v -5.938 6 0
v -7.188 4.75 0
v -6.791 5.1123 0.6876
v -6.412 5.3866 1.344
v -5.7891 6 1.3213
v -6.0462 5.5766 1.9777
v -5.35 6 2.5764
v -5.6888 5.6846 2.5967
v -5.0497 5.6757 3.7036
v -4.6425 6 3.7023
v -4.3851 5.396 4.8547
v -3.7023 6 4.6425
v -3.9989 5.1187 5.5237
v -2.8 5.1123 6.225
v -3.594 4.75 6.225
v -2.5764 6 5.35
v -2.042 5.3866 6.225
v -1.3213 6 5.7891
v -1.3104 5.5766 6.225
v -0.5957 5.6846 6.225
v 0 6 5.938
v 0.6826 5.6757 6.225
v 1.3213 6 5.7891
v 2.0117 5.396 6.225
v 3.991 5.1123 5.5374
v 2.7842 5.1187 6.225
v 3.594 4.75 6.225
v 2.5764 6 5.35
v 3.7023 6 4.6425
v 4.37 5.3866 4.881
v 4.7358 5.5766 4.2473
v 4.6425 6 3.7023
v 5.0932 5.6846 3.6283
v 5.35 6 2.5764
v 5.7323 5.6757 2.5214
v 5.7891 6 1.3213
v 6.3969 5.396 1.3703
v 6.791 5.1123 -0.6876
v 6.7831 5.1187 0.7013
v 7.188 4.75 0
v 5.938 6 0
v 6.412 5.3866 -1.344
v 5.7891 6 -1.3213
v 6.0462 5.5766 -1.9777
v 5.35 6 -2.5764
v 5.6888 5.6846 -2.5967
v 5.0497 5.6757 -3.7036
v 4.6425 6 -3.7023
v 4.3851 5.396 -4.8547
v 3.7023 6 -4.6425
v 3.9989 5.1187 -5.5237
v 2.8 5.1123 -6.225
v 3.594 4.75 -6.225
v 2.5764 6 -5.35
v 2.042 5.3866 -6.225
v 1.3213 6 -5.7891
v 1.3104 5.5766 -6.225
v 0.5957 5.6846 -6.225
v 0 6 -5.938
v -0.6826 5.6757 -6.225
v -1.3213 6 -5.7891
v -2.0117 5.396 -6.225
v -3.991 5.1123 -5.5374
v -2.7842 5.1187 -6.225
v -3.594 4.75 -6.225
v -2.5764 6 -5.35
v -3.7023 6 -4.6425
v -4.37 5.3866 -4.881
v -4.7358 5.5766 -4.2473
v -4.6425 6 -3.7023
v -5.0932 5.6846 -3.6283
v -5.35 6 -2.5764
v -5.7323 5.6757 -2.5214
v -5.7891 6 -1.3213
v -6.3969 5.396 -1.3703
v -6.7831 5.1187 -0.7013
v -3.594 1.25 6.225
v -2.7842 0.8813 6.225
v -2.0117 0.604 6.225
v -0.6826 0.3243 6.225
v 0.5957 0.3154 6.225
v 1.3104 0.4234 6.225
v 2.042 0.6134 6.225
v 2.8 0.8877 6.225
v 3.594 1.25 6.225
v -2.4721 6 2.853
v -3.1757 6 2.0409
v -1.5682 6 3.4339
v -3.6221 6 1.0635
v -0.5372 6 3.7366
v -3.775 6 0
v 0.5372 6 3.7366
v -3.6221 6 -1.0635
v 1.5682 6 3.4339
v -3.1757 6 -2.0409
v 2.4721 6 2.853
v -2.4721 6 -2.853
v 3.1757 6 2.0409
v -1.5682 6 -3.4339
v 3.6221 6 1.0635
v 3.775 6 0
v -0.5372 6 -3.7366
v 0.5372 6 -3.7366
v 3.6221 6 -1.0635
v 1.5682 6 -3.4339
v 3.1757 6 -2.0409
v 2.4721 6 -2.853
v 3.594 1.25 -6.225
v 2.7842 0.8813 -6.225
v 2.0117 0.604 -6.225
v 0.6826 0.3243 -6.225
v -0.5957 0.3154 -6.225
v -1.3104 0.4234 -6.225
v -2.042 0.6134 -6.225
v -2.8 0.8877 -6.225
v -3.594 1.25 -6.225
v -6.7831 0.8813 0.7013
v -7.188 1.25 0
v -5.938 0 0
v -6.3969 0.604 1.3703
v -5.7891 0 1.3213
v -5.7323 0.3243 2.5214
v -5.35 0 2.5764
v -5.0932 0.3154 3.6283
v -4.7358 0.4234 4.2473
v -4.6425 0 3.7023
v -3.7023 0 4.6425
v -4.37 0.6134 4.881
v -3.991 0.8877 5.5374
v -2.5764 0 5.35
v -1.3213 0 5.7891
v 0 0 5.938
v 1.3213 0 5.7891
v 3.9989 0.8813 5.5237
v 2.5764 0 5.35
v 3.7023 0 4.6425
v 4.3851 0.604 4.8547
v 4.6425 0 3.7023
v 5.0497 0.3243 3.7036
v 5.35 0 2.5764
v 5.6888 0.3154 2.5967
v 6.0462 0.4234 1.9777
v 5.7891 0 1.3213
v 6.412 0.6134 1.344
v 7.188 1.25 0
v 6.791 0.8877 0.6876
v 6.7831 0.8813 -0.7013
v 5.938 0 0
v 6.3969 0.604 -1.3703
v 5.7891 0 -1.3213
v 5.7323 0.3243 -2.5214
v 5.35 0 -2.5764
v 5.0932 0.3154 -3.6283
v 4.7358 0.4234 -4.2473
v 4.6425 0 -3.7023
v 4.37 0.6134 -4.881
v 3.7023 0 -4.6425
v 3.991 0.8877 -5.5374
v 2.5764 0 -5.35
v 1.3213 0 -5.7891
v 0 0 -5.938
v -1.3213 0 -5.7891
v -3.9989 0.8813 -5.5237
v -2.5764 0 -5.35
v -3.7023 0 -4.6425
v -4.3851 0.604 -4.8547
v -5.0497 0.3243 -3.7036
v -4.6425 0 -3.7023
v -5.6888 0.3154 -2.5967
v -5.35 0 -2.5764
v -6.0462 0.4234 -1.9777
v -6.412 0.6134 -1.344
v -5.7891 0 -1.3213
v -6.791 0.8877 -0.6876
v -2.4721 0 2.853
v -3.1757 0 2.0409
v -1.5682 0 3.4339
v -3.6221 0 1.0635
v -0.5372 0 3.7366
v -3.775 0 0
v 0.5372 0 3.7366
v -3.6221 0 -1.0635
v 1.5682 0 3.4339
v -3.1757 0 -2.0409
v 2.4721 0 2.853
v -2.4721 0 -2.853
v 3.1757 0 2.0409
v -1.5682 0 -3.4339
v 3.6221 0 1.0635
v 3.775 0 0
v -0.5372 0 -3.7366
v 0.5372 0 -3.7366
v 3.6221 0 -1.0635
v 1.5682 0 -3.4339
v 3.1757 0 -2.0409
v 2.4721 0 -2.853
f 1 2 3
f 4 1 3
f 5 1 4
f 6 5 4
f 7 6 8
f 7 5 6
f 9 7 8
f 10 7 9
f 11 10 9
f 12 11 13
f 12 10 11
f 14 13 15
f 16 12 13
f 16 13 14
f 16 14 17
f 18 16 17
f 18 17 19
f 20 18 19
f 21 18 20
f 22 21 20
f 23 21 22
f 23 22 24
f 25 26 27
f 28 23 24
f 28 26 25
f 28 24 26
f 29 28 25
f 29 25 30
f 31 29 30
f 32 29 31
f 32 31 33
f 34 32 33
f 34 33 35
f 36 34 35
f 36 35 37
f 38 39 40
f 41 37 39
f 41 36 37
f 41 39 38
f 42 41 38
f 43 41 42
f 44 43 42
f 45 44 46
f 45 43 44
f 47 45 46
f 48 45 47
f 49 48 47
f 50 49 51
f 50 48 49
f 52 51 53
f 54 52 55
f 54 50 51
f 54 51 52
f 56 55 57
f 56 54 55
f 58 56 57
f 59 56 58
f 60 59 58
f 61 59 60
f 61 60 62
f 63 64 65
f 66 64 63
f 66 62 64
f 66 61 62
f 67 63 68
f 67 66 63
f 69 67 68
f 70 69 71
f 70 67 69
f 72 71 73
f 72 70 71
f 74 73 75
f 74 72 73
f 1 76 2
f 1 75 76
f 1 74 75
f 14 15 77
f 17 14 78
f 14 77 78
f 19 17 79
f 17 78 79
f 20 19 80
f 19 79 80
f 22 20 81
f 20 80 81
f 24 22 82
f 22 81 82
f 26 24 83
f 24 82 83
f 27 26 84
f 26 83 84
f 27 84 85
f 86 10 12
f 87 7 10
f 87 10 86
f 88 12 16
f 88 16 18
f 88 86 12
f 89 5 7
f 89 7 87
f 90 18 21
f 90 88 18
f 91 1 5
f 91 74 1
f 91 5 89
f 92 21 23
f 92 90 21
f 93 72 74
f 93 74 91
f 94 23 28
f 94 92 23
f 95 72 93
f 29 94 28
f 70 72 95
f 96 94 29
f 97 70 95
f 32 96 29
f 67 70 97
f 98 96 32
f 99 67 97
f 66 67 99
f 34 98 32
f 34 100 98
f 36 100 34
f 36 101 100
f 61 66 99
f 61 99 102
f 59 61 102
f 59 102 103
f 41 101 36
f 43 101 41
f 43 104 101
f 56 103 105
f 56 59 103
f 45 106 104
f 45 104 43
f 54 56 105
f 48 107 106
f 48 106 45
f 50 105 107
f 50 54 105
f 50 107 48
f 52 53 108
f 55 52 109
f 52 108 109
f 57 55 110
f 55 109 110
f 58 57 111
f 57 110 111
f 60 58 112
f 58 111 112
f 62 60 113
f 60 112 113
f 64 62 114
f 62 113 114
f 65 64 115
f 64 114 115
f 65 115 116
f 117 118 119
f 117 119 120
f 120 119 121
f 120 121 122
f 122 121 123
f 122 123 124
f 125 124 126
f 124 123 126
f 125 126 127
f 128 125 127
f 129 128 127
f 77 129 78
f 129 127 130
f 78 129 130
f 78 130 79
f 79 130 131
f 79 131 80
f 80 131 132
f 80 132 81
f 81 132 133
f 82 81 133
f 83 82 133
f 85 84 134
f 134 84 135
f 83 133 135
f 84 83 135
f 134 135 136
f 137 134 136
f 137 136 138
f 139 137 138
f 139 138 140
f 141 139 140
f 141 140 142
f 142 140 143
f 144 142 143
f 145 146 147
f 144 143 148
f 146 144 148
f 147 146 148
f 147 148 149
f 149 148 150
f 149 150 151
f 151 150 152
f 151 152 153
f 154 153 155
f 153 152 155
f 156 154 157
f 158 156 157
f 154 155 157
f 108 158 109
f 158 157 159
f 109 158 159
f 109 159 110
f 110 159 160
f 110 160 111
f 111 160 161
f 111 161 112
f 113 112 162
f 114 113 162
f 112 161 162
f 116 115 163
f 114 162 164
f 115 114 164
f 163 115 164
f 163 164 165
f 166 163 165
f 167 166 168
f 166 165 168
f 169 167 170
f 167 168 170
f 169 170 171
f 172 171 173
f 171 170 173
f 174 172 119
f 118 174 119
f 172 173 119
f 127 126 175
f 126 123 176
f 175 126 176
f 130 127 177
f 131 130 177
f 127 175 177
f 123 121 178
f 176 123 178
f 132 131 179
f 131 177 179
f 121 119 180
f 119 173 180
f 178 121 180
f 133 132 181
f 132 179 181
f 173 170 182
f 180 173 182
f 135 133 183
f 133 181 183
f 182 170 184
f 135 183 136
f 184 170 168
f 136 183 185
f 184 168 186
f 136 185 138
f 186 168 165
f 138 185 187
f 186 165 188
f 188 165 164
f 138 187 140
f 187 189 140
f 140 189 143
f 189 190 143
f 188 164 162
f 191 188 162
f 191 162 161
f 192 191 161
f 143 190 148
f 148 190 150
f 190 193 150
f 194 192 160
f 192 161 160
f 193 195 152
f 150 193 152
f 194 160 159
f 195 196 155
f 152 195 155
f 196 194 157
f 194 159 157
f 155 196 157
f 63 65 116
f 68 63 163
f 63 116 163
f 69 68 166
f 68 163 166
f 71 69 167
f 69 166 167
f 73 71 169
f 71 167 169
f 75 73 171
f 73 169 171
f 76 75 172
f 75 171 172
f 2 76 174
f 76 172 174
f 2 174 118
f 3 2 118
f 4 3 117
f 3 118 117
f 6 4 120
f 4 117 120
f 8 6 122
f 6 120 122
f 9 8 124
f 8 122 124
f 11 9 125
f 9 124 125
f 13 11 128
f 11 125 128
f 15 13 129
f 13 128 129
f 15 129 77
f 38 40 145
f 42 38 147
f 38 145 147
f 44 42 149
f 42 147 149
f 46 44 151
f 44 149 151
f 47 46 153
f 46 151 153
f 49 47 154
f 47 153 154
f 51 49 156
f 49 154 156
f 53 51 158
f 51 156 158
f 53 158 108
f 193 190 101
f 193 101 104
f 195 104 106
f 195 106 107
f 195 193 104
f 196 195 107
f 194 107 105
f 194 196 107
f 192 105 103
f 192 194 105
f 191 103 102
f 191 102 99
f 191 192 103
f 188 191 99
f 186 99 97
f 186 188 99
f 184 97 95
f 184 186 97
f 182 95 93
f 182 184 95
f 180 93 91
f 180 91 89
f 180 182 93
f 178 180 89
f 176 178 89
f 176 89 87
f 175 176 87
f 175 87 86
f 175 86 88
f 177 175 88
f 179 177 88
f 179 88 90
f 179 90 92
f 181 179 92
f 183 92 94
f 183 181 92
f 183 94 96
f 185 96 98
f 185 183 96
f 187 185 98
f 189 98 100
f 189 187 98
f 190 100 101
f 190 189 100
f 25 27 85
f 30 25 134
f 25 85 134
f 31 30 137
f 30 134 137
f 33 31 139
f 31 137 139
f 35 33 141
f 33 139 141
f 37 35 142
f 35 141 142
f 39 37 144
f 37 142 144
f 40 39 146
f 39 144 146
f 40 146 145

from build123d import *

# Parameters (mm, degrees)
SKETCH1_R           = 3.775
BOSS_EXTRUDE1_DEPTH = 6


with BuildPart() as part:
    # Sketch1 → Boss-Extrude1 (new body)
    with BuildSketch(Plane(origin=(0, 0, 0), x_dir=(1, 0, 0), z_dir=(0, 1, 0))):
        Polygon((-7.188010851, 0), (-3.594005426, -6.225), (3.594005426, -6.225), (7.188010851, 0), (3.594005426, 6.225), (-3.594005426, 6.225), align=None)
        Circle(SKETCH1_R, mode=Mode.SUBTRACT)
    extrude(amount=BOSS_EXTRUDE1_DEPTH)

    # Sketch5 → Cut-Revolve1 (revolve, cut)
    with BuildSketch(Plane.XY):
        Polygon((-5.938010851, 6), (-7.188010851, 6), (-7.188010851, 4.75), align=None)
        Polygon((-5.938010851, 0), (-7.188010851, 0), (-7.188010851, 1.25), align=None)
    revolve(axis=Axis((0, 0, 0), (0, 1, 0)), mode=Mode.SUBTRACT)


solid = part.part
